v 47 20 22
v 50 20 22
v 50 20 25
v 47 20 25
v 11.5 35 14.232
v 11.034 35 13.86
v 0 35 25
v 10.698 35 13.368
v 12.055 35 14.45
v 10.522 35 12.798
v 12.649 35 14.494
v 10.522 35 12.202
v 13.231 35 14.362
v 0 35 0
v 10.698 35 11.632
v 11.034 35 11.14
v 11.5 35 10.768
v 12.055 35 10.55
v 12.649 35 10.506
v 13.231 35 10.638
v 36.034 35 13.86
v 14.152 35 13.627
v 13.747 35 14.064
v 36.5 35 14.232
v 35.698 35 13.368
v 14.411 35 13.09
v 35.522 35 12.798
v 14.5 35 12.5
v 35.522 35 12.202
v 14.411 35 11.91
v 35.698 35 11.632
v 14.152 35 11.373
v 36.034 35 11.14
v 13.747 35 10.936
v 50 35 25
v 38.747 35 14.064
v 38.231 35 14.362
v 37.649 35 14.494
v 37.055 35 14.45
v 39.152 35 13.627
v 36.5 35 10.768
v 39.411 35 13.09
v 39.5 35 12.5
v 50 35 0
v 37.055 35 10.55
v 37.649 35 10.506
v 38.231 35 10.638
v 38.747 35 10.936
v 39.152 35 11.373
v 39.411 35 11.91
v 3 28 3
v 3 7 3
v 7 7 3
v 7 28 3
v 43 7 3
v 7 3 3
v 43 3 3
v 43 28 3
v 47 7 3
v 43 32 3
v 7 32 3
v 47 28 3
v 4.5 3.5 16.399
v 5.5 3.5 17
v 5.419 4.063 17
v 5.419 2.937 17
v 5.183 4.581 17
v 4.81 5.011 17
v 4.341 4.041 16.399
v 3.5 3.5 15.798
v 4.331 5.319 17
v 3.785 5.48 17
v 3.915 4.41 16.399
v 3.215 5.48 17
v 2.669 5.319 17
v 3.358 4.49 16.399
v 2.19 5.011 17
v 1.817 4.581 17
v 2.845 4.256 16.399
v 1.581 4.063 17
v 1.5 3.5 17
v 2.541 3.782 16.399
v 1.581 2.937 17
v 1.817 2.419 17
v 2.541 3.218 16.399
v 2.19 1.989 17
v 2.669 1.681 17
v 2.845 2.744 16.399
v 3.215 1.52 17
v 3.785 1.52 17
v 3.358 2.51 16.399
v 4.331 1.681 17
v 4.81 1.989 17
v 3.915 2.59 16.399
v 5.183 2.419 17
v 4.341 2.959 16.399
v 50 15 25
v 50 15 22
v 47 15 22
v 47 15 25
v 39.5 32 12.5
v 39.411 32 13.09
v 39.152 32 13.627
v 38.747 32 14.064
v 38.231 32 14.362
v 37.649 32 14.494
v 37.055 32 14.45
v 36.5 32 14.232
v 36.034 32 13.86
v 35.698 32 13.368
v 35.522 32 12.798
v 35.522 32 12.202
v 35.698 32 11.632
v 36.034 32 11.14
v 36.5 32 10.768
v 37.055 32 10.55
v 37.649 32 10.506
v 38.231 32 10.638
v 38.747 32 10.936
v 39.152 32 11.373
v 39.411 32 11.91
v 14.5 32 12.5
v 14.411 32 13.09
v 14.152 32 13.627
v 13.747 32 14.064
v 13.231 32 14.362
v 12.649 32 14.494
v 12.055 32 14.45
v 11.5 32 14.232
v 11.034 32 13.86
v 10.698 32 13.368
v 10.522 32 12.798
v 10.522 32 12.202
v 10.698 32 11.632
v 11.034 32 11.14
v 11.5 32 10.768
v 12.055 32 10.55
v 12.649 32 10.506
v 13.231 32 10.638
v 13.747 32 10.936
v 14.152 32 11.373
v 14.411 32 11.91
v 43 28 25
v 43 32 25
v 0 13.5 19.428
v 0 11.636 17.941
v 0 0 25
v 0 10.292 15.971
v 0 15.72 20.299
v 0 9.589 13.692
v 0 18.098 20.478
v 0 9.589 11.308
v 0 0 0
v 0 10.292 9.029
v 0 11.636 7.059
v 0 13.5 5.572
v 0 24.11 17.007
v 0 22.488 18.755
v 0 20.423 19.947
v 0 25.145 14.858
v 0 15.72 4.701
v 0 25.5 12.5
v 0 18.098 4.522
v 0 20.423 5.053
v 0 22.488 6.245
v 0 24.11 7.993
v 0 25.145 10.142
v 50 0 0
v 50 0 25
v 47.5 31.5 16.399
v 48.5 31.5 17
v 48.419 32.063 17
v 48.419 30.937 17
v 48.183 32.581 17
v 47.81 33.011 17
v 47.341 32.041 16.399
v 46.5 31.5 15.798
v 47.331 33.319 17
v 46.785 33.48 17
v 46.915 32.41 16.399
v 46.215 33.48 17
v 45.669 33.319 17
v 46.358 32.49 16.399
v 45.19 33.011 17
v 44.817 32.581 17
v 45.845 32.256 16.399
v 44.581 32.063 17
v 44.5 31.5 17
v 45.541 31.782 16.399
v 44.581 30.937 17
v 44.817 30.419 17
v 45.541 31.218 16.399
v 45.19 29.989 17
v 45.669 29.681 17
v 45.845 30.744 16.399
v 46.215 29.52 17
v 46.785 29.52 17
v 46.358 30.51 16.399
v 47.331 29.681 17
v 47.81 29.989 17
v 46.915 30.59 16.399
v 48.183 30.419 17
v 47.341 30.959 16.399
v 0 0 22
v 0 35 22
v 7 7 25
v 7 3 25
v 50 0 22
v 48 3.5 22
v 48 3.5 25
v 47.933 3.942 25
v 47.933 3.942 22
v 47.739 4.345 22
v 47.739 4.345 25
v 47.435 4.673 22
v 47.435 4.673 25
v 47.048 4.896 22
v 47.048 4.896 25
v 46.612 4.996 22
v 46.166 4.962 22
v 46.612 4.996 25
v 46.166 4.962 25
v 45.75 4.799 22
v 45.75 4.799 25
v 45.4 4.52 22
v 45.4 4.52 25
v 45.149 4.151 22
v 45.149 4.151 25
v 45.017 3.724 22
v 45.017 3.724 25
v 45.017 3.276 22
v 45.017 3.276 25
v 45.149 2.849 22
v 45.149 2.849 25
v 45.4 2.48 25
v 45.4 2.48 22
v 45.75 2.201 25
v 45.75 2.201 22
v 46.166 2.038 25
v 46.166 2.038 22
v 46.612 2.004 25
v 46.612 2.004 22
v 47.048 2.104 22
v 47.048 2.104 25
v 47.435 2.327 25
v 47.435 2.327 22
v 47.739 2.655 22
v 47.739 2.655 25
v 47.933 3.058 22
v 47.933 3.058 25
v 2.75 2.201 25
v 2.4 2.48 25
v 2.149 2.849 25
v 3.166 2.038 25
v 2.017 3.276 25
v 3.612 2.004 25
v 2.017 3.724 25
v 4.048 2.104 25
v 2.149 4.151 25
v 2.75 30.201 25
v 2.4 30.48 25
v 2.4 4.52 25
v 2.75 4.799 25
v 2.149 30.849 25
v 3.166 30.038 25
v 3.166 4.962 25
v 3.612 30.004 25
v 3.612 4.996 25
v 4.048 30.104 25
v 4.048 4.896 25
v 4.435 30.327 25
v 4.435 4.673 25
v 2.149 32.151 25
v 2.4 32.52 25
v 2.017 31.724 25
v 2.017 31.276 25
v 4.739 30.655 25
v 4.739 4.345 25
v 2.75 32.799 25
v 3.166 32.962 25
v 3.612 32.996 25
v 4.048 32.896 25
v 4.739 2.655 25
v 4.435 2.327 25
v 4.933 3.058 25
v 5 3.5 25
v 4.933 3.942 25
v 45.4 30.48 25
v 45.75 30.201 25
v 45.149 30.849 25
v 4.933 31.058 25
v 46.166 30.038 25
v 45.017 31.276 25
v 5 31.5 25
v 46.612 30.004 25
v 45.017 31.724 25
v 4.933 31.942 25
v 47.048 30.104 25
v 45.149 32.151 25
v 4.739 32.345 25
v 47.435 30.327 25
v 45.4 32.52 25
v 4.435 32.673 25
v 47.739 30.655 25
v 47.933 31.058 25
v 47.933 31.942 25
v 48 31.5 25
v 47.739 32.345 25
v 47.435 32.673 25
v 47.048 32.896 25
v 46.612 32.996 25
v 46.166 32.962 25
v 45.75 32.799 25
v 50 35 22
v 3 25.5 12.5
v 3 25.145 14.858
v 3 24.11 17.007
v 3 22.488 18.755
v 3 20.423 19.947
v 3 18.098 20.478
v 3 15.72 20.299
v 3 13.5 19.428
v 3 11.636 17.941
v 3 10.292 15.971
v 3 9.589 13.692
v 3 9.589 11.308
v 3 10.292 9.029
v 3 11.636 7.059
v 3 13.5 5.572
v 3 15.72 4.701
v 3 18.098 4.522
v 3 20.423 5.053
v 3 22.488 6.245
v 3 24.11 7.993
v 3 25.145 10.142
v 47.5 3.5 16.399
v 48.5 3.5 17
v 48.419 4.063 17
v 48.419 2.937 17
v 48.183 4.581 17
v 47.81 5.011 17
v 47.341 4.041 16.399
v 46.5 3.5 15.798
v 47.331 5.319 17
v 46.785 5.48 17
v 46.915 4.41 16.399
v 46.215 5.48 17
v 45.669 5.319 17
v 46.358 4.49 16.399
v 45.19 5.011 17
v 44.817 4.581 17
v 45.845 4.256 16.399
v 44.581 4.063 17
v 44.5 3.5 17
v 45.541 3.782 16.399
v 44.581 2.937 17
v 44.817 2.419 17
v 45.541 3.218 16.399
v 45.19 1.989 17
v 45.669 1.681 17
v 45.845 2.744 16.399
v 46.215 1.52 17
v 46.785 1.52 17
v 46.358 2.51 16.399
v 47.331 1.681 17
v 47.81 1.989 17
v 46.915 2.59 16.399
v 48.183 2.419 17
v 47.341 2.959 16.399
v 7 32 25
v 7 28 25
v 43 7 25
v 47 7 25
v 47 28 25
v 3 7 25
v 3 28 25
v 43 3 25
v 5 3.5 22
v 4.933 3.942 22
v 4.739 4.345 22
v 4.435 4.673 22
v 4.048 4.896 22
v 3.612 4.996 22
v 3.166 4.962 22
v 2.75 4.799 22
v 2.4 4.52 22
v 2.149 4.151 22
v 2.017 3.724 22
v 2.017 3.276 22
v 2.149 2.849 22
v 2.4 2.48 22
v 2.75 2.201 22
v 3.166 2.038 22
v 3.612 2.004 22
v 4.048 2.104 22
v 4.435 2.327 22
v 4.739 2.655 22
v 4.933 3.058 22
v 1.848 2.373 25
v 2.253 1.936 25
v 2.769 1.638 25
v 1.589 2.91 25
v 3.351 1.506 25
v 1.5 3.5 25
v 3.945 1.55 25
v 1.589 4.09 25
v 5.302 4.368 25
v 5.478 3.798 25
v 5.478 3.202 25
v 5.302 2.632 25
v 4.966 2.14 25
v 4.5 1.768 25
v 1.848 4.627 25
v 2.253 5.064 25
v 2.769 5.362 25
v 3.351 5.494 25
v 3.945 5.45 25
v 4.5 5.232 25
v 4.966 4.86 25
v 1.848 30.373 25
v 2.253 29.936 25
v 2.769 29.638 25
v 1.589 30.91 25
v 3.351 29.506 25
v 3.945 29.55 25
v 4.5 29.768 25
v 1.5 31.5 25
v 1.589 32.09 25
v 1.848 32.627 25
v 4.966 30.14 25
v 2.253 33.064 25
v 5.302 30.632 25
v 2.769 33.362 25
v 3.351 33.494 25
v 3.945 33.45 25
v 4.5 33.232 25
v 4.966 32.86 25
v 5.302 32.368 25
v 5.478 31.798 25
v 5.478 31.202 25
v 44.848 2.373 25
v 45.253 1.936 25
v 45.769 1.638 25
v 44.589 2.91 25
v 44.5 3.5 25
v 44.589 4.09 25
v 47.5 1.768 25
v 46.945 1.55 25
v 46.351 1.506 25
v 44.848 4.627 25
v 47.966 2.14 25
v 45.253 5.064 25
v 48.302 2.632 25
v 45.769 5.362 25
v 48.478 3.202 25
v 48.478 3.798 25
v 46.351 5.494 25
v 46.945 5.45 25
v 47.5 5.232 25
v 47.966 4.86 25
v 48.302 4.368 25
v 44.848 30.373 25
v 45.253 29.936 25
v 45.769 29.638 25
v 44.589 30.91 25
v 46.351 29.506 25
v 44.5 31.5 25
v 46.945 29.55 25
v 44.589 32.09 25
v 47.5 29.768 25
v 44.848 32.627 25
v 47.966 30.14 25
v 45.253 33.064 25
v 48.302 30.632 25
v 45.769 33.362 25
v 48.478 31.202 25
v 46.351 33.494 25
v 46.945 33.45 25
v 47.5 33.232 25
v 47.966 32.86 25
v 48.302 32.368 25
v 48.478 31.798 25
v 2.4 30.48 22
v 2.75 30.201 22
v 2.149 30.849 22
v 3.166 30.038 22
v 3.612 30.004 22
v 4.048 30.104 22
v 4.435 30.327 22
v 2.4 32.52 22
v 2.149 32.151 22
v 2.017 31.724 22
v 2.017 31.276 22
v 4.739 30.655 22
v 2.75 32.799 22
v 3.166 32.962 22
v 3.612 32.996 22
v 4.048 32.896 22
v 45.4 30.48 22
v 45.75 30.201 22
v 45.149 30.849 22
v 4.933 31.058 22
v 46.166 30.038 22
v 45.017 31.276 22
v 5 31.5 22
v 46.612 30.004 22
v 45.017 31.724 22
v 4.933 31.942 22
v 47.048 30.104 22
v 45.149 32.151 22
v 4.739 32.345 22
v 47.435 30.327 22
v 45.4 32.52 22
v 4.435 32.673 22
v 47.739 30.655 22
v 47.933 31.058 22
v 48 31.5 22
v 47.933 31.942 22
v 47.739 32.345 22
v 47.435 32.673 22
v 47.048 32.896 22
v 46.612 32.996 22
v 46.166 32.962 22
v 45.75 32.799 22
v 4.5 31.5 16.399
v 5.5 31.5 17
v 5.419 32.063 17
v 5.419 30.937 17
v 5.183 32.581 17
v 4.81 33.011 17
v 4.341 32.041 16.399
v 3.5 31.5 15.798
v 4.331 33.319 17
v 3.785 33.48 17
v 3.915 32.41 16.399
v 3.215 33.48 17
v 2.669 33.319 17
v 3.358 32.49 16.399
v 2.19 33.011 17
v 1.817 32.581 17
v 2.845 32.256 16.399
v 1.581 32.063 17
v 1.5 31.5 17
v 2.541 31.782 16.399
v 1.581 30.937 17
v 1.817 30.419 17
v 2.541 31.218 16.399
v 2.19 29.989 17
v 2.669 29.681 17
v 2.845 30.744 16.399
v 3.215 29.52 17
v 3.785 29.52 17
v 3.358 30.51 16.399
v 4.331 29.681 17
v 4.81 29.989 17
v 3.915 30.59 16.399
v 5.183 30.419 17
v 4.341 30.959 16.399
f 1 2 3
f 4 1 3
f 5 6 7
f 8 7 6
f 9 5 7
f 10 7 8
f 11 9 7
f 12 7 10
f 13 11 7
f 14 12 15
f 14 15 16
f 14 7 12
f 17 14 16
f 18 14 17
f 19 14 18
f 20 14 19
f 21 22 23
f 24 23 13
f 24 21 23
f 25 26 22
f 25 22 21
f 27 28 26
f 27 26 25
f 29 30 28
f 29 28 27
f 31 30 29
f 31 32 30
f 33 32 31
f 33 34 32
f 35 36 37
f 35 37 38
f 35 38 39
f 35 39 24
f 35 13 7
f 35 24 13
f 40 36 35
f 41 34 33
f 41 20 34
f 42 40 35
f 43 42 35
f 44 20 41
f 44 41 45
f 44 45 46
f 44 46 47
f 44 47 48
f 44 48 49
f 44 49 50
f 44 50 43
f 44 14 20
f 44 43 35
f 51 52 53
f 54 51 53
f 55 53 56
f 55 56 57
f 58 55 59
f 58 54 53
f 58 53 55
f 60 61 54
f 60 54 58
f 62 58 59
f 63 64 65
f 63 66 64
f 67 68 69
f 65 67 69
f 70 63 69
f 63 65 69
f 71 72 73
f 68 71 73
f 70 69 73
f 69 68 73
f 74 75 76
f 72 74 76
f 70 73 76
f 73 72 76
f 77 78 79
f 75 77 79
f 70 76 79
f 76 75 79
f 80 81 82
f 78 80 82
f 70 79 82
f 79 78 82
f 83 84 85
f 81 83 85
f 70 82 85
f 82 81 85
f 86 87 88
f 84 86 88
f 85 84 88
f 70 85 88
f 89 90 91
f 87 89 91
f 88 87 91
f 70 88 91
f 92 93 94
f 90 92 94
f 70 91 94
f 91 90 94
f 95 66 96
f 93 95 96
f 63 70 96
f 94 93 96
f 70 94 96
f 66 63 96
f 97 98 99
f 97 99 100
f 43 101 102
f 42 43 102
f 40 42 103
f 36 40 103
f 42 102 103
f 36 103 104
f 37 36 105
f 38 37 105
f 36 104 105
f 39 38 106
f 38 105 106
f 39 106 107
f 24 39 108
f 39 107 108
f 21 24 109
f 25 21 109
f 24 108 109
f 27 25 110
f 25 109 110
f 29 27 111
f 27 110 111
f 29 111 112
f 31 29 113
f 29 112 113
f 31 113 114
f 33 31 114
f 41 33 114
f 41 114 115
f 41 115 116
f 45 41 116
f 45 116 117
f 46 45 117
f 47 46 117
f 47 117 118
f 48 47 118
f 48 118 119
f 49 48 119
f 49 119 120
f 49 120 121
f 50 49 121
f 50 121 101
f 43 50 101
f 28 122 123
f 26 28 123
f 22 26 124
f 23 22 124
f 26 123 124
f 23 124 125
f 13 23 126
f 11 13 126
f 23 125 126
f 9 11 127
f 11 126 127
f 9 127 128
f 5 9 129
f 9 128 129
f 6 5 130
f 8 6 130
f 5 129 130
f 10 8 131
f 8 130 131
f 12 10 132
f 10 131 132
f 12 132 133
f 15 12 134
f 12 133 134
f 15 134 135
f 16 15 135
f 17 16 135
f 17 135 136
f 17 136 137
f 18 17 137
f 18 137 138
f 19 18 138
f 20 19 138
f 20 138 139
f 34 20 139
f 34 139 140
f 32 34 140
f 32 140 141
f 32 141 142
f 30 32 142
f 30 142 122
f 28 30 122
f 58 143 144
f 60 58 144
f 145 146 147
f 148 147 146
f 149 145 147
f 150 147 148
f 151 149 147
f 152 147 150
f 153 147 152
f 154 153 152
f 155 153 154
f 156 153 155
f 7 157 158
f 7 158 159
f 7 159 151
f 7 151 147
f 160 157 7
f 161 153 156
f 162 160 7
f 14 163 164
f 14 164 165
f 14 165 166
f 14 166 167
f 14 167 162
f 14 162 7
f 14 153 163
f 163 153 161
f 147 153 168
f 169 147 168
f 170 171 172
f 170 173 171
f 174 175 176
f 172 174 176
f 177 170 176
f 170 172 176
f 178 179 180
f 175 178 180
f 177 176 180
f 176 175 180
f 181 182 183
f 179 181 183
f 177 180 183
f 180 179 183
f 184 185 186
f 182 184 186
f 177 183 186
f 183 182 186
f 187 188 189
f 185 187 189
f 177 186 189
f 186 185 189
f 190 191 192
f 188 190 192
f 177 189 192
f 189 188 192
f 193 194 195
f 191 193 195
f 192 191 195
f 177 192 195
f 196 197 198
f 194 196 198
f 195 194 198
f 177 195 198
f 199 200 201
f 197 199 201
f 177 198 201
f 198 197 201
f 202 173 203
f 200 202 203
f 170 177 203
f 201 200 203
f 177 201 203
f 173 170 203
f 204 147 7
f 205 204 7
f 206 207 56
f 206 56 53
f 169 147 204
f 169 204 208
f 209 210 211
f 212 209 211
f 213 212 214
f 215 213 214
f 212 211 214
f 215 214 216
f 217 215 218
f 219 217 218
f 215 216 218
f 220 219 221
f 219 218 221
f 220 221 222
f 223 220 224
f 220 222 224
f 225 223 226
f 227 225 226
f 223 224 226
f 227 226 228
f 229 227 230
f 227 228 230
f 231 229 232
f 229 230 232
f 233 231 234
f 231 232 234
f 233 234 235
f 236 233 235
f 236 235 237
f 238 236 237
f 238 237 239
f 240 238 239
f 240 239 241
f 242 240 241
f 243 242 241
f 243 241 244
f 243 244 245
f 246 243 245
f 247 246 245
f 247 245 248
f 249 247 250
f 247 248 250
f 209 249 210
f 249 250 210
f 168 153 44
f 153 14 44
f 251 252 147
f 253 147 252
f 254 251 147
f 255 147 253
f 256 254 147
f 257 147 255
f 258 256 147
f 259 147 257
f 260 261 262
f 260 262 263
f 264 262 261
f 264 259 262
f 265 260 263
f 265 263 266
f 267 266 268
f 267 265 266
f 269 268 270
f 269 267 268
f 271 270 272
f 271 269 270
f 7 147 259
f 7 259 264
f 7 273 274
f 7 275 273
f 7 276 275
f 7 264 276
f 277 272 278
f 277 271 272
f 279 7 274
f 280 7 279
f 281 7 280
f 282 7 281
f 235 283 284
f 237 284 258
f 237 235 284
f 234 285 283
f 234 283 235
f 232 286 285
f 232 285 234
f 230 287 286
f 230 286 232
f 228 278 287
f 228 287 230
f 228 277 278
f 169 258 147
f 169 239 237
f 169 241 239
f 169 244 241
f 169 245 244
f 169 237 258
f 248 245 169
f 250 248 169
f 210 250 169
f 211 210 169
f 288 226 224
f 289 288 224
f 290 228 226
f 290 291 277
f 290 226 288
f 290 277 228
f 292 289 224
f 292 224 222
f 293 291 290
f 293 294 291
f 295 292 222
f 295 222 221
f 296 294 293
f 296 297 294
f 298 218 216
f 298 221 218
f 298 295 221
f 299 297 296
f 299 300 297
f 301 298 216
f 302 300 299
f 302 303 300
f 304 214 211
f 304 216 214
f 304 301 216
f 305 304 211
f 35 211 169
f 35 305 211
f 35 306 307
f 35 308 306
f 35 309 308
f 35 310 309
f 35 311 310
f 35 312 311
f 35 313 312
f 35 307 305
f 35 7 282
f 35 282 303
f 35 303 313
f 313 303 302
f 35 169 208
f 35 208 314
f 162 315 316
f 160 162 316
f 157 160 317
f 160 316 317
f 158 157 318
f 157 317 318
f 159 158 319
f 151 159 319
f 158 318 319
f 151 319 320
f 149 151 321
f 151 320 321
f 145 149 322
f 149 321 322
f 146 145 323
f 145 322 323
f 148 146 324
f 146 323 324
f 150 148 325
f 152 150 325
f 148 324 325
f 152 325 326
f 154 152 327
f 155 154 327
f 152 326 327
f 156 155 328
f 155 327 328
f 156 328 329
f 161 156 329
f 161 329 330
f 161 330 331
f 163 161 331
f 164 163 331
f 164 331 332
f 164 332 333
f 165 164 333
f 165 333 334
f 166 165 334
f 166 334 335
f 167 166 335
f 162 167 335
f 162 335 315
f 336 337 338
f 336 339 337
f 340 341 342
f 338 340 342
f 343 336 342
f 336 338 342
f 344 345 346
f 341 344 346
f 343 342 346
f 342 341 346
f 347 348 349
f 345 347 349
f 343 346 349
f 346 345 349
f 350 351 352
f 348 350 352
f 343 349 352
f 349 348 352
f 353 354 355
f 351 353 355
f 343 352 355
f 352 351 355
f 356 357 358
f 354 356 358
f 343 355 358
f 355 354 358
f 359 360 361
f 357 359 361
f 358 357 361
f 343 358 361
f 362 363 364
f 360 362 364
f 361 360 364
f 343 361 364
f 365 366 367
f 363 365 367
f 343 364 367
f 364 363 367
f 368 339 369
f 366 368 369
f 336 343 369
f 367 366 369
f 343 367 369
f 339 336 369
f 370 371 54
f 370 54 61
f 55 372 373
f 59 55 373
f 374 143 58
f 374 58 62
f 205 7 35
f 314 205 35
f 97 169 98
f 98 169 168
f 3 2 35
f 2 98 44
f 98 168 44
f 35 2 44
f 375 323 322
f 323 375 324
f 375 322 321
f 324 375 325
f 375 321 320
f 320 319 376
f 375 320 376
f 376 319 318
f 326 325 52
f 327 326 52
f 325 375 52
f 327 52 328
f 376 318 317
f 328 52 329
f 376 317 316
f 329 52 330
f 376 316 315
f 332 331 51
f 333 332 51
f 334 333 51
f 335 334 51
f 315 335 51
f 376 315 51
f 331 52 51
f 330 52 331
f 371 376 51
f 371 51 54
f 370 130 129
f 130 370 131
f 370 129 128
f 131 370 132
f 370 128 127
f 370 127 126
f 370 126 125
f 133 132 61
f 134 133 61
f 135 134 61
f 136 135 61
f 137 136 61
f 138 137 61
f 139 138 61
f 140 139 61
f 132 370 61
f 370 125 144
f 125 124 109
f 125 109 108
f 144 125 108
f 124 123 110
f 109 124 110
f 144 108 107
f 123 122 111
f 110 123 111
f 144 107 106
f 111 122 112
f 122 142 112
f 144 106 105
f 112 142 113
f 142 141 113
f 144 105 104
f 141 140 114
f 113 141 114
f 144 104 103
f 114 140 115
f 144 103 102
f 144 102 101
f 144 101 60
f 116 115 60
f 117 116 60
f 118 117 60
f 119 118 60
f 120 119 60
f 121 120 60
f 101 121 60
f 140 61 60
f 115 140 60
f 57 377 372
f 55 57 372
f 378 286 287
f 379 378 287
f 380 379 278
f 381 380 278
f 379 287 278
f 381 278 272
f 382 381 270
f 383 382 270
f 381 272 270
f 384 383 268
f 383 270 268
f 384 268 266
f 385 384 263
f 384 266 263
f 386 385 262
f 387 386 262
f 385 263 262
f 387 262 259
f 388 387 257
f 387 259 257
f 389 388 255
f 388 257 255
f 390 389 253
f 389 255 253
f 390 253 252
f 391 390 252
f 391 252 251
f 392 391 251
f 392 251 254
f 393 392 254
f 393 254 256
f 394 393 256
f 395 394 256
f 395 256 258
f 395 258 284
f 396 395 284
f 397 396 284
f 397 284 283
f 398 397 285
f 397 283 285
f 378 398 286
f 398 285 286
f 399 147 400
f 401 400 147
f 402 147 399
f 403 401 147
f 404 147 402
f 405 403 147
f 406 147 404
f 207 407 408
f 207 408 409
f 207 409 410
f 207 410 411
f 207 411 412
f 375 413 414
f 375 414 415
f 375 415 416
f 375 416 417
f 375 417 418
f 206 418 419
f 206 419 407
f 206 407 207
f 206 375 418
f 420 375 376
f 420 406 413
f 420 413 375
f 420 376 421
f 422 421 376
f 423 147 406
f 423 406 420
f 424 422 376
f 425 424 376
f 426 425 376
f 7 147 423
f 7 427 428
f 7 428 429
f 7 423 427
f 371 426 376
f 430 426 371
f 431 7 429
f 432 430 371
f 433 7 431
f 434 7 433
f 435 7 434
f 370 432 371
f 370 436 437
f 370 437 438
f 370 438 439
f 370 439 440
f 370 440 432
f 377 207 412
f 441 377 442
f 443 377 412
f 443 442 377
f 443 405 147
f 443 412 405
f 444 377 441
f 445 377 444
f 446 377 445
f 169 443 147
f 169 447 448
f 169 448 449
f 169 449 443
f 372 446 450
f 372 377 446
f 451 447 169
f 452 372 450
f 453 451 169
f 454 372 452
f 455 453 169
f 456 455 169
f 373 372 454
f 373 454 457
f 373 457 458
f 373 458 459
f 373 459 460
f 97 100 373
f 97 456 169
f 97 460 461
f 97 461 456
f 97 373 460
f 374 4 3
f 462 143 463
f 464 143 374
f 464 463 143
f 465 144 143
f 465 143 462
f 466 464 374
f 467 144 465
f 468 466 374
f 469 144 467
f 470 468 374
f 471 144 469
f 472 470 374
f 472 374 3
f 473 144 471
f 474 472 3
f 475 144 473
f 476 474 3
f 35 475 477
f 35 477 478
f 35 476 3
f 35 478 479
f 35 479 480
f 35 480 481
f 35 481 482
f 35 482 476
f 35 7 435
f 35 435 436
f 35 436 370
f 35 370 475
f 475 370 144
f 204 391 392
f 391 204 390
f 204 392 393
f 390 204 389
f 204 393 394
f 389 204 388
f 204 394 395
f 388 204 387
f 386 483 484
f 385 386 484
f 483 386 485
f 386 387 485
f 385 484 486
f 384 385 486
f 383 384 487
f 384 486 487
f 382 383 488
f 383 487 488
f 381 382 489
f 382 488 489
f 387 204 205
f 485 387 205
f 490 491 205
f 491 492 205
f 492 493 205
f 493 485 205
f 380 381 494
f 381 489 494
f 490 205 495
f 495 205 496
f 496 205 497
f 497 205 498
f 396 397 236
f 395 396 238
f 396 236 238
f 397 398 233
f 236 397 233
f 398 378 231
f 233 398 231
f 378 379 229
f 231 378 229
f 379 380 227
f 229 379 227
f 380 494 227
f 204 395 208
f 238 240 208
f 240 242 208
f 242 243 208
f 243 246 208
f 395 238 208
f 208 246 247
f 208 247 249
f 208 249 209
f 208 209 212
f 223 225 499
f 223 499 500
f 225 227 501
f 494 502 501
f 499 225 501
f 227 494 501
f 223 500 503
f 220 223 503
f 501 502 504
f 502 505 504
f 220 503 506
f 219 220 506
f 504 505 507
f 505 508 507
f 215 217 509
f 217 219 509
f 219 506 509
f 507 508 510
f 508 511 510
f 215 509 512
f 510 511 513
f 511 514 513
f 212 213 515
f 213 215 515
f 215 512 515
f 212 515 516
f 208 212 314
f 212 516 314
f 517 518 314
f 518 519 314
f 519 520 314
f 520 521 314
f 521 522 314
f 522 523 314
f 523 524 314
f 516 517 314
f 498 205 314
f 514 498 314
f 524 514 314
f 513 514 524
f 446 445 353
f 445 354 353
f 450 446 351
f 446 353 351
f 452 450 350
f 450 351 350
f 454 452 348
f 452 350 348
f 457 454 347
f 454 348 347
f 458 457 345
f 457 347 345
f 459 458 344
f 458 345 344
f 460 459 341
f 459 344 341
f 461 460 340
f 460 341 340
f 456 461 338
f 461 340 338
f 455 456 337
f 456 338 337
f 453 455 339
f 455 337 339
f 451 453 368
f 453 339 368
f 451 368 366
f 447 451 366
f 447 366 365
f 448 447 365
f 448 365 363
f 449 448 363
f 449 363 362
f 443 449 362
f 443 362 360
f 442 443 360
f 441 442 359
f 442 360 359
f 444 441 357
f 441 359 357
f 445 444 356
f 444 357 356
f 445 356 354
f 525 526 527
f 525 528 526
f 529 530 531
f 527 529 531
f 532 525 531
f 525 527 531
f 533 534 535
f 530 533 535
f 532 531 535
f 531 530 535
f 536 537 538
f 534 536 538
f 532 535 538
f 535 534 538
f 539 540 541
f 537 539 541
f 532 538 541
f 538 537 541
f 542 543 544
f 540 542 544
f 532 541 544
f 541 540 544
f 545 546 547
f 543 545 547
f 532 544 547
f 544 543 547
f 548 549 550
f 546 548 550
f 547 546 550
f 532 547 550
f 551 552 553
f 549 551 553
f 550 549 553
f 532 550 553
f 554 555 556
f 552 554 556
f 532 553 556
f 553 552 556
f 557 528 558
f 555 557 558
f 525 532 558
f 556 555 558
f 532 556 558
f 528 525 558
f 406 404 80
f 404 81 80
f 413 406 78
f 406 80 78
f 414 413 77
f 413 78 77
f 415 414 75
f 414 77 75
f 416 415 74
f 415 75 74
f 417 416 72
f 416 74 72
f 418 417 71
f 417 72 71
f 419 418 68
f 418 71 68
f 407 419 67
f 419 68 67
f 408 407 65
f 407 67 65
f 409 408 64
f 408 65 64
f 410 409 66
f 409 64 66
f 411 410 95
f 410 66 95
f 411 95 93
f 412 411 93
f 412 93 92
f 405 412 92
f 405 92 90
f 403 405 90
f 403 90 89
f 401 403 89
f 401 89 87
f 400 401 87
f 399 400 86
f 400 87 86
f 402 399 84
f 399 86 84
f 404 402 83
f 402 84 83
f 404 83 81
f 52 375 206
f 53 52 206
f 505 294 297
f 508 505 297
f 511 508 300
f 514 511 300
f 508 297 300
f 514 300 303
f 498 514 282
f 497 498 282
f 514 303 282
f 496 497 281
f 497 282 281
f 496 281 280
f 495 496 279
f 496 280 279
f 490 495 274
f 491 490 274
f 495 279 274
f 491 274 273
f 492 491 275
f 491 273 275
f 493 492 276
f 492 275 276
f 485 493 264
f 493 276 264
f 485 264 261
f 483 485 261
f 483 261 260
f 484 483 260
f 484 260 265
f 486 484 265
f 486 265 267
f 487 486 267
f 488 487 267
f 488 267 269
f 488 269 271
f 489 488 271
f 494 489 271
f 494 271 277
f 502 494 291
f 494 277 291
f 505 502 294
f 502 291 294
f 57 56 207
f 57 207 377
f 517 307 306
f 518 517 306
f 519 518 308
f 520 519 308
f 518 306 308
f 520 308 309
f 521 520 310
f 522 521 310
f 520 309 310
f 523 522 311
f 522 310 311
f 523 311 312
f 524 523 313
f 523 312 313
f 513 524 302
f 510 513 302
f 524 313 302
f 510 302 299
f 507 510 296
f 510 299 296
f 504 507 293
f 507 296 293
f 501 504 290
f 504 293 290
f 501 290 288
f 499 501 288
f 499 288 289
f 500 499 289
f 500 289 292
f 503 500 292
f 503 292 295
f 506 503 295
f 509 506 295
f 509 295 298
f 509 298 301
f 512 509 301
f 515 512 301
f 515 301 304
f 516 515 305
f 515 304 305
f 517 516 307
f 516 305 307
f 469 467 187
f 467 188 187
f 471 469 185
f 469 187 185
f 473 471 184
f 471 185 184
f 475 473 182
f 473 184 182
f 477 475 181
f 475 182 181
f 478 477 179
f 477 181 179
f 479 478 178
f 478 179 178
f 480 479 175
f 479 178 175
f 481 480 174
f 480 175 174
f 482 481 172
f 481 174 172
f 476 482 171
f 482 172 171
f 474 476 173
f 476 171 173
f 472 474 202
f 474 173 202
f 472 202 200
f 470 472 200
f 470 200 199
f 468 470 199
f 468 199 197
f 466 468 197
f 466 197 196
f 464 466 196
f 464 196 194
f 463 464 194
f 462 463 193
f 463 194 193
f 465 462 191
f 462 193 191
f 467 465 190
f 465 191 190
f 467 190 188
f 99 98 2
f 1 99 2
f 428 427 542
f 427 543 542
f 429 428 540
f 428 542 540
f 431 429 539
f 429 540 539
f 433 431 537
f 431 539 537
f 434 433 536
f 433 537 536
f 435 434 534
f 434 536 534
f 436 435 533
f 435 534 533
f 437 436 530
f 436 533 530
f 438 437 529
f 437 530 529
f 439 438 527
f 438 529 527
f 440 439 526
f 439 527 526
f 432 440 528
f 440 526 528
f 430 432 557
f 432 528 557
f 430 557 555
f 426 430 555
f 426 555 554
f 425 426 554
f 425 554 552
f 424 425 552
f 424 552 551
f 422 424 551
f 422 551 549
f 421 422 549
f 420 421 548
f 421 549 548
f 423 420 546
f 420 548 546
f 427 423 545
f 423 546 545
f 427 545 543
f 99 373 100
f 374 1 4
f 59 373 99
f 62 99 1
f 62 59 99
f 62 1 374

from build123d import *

# Parameters (mm, degrees)
F0_W      = 50
F0_H      = 35
F1_DEPTH  = 25
F2_T      = -3
F3_W      = 7
F3_H      = 7
F4_DEPTH  = 25
F6_D      = 4
F6_DEPTH  = 8
F6_TIP    = 1.2017212381
F8_D      = 16
F8_DEPTH  = 20
F8_TIP    = 4.8068849522
F9_W      = 5
F9_H      = 6
F10_DEPTH = 25
F12_D     = 4
F12_DEPTH = 6
F12_TIP   = 1.2017212381
F13_D     = 4
F13_DEPTH = 6
F13_TIP   = 1.2017212381
F14_W     = 50
F14_H     = 35
F14_R     = 1.5
F15_DEPTH = 3


with BuildPart() as f1:
    # F0 (on Top) → F1 (new body)
    with BuildSketch(Plane.XY):
        with Locations((25, 17.5)):
            Rectangle(F0_W, F0_H)
    extrude(amount=F1_DEPTH)

    # F2
    f2_openings = [f1.faces().sort_by_distance(p)[0] for p in [
        (25, 17.5, 25),
    ]]
    offset(amount=F2_T, openings=f2_openings)

    # F3 (on face) → F4 (join)
    with BuildSketch(Plane.XY.offset(25)):
        with Locations((3.5, 3.5)):
            Rectangle(F3_W, F3_H)
        with Locations((3.5, 31.5)):
            Rectangle(F3_W, F3_H)
        with Locations((46.5, 31.5)):
            Rectangle(F3_W, F3_H)
        with Locations((46.5, 3.5)):
            Rectangle(F3_W, F3_H)
    extrude(amount=-F4_DEPTH)

    # F6
    with Locations(Plane.XY.offset(25)):
        with Locations((3.5, 3.5), (46.5, 3.5), (46.5, 31.5), (3.5, 31.5)):
            Hole(F6_D / 2, depth=F6_DEPTH)
            with Locations((0, 0, -(F6_DEPTH + F6_TIP / 2))):  # 118° drill point
                Cone(0, F6_D / 2, F6_TIP, mode=Mode.SUBTRACT)

    # F8
    with Locations(Plane(origin=(0, 0, 0), x_dir=(0, -1, 0), z_dir=(-1, 0, 0))):
        with Locations((-17.5, 12.5)):
            Hole(F8_D / 2, depth=F8_DEPTH)
            with Locations((0, 0, -(F8_DEPTH + F8_TIP / 2))):  # 118° drill point
                Cone(0, F8_D / 2, F8_TIP, mode=Mode.SUBTRACT)

    # F9 (on face) → F10 (cut)
    with BuildSketch(Plane.YZ.offset(50)):
        with Locations((17.5, 25)):
            Rectangle(F9_W, F9_H)
    extrude(amount=-F10_DEPTH, mode=Mode.SUBTRACT)

    # F12
    with Locations(Plane(origin=(0, 35, 0), x_dir=(-1, 0, 0), z_dir=(0, 1, 0))):
        with Locations((-37.5, 12.5)):
            Hole(F12_D / 2, depth=F12_DEPTH)
            with Locations((0, 0, -(F12_DEPTH + F12_TIP / 2))):  # 118° drill point
                Cone(0, F12_D / 2, F12_TIP, mode=Mode.SUBTRACT)

    # F13
    with Locations(Plane(origin=(0, 35, 0), x_dir=(-1, 0, 0), z_dir=(0, 1, 0))):
        with Locations((-12.5, 12.5)):
            Hole(F13_D / 2, depth=F13_DEPTH)
            with Locations((0, 0, -(F13_DEPTH + F13_TIP / 2))):  # 118° drill point
                Cone(0, F13_D / 2, F13_TIP, mode=Mode.SUBTRACT)


with BuildPart() as f15:
    # F14 (on face) → F15 (new body)
    with BuildSketch(Plane.XY.offset(25)):
        with Locations((25, 17.5)):
            Rectangle(F14_W, F14_H)
        with Locations((3.5, 3.5)):
            Circle(F14_R, mode=Mode.SUBTRACT)
        with Locations((46.5, 3.5)):
            Circle(F14_R, mode=Mode.SUBTRACT)
        with Locations((3.5, 31.5)):
            Circle(F14_R, mode=Mode.SUBTRACT)
        with Locations((46.5, 31.5)):
            Circle(F14_R, mode=Mode.SUBTRACT)
    extrude(amount=-F15_DEPTH)


solid = Compound([f1.part, f15.part])
